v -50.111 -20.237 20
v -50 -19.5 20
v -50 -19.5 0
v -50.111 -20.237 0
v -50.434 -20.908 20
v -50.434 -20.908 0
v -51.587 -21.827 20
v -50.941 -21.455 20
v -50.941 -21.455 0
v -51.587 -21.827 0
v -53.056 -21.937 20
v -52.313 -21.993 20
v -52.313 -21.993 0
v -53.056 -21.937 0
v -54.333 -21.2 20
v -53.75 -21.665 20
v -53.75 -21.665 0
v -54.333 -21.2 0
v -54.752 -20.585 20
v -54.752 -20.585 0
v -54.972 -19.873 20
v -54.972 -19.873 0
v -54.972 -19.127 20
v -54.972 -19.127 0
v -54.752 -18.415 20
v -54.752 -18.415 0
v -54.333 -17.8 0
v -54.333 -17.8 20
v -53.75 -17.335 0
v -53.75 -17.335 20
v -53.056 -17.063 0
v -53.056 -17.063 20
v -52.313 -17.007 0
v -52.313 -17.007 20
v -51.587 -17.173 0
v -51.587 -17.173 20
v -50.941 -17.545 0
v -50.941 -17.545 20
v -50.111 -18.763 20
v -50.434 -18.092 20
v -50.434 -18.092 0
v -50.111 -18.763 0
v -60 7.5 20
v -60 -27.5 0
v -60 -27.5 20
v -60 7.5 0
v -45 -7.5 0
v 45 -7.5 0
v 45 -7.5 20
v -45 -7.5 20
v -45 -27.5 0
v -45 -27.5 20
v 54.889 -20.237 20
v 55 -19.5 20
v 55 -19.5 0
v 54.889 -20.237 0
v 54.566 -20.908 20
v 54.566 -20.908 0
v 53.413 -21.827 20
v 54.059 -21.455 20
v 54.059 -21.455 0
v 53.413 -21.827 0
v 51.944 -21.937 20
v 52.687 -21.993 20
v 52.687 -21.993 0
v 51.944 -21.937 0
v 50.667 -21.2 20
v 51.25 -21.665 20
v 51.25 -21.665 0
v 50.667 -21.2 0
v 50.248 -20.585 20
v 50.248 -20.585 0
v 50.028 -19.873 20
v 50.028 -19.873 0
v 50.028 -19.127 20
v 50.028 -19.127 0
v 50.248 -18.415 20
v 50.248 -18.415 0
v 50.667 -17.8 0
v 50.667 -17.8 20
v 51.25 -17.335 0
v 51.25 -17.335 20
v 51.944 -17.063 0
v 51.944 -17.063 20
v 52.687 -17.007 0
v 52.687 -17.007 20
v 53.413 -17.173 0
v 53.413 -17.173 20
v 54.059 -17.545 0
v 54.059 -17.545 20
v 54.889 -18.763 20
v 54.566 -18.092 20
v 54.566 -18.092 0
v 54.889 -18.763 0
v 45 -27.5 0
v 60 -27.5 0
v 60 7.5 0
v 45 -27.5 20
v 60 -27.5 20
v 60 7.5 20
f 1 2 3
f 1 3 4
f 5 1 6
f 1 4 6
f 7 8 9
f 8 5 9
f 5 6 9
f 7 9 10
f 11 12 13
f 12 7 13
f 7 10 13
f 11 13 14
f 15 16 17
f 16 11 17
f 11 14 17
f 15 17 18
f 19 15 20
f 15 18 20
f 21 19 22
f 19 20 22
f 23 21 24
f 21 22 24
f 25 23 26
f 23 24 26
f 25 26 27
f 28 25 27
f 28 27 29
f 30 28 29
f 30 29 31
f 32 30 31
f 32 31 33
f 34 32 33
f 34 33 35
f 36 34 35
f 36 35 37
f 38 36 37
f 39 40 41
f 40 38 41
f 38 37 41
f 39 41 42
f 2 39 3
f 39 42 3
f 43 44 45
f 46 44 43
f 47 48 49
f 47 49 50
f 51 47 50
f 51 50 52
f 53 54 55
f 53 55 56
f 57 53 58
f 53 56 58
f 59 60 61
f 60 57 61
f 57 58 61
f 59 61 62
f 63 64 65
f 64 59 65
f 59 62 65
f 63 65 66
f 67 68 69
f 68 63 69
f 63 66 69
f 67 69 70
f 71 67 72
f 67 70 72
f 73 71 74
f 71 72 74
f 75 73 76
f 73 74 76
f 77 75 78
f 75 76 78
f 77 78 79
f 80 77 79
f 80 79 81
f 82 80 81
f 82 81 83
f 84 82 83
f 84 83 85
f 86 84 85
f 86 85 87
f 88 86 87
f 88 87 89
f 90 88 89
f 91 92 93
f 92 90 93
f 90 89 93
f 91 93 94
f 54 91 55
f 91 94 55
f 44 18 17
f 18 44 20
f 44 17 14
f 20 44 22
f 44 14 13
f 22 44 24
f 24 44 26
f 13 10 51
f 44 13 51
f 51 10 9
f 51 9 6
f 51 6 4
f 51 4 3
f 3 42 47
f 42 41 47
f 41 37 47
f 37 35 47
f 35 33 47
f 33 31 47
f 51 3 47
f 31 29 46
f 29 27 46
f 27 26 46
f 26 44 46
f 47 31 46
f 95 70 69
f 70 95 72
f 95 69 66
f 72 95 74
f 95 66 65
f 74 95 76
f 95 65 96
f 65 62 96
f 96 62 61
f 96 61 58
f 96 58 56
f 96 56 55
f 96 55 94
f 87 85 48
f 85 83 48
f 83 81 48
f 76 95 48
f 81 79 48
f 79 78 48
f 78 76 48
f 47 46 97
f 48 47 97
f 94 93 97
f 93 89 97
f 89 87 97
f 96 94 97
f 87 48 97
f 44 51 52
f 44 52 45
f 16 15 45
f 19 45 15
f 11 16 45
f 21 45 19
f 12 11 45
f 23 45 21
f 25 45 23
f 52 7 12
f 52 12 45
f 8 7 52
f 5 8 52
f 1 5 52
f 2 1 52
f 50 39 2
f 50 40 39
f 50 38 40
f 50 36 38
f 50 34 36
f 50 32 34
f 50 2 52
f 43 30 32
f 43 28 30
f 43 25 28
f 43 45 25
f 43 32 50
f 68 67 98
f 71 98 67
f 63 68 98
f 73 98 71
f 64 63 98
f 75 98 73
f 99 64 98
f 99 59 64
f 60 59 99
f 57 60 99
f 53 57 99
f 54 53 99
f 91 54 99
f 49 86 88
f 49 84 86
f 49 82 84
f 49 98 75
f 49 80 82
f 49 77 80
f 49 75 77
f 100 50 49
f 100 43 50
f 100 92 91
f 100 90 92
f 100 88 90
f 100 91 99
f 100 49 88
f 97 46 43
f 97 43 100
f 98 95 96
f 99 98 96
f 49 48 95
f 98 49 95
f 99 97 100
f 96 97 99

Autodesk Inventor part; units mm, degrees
ref_plane "YZ Plane" through (0, 0, 0) normal (1, 0, 0) x (0, 1, 0)
ref_plane "XZ Plane" through (0, 0, 0) normal (0, 1, 0) x (-1, 0, 0)
ref_plane "XY Plane" through (0, 0, 0) normal (0, 0, 1) x (1, 0, 0)
sketch "Sketch1" plane through (0, 0, 0) normal (0, 0, 1) x (1, 0, 0)
  line L0 (-60, 7.5) -> (60, 7.5)
  line L1 (60, 7.5) -> (60, -7.5)
  line L2 (60, -7.5) -> (-60, -7.5)
  line L3 (-60, -7.5) -> (-60, 7.5)
  line L4 (-60, 7.5) -> (60, -7.5) construction
  line L5 (60, 7.5) -> (-60, -7.5) construction
  line L6 (-60, -7.5) -> (-45, -7.5)
  line L7 (-45, -7.5) -> (-45, -27.5)
  line L8 (-45, -27.5) -> (-60, -27.5)
  line L9 (-60, -27.5) -> (-60, -7.5)
  line L10 (60, -7.5) -> (45, -7.5)
  line L11 (45, -7.5) -> (45, -27.5)
  line L12 (45, -27.5) -> (60, -27.5)
  line L13 (60, -27.5) -> (60, -7.5)
  circle A0 centre (-52.5, -19.5) radius 2.5
  circle A1 centre (52.5, -19.5) radius 2.5
  point P0 (0, 0)
  dimension "d17" = 120
  dimension "d18" = 15
  dimension "d19" = 15
  dimension "d20" = 20
  dimension "d21" = 15
  dimension "d22" = 20
  dimension "d23" = 5
  dimension "d24" = 5
extrude "Extrusion1" add sketch "Sketch1" along normal blind 20
properties part number "front_U_shaped_frame[1]"
